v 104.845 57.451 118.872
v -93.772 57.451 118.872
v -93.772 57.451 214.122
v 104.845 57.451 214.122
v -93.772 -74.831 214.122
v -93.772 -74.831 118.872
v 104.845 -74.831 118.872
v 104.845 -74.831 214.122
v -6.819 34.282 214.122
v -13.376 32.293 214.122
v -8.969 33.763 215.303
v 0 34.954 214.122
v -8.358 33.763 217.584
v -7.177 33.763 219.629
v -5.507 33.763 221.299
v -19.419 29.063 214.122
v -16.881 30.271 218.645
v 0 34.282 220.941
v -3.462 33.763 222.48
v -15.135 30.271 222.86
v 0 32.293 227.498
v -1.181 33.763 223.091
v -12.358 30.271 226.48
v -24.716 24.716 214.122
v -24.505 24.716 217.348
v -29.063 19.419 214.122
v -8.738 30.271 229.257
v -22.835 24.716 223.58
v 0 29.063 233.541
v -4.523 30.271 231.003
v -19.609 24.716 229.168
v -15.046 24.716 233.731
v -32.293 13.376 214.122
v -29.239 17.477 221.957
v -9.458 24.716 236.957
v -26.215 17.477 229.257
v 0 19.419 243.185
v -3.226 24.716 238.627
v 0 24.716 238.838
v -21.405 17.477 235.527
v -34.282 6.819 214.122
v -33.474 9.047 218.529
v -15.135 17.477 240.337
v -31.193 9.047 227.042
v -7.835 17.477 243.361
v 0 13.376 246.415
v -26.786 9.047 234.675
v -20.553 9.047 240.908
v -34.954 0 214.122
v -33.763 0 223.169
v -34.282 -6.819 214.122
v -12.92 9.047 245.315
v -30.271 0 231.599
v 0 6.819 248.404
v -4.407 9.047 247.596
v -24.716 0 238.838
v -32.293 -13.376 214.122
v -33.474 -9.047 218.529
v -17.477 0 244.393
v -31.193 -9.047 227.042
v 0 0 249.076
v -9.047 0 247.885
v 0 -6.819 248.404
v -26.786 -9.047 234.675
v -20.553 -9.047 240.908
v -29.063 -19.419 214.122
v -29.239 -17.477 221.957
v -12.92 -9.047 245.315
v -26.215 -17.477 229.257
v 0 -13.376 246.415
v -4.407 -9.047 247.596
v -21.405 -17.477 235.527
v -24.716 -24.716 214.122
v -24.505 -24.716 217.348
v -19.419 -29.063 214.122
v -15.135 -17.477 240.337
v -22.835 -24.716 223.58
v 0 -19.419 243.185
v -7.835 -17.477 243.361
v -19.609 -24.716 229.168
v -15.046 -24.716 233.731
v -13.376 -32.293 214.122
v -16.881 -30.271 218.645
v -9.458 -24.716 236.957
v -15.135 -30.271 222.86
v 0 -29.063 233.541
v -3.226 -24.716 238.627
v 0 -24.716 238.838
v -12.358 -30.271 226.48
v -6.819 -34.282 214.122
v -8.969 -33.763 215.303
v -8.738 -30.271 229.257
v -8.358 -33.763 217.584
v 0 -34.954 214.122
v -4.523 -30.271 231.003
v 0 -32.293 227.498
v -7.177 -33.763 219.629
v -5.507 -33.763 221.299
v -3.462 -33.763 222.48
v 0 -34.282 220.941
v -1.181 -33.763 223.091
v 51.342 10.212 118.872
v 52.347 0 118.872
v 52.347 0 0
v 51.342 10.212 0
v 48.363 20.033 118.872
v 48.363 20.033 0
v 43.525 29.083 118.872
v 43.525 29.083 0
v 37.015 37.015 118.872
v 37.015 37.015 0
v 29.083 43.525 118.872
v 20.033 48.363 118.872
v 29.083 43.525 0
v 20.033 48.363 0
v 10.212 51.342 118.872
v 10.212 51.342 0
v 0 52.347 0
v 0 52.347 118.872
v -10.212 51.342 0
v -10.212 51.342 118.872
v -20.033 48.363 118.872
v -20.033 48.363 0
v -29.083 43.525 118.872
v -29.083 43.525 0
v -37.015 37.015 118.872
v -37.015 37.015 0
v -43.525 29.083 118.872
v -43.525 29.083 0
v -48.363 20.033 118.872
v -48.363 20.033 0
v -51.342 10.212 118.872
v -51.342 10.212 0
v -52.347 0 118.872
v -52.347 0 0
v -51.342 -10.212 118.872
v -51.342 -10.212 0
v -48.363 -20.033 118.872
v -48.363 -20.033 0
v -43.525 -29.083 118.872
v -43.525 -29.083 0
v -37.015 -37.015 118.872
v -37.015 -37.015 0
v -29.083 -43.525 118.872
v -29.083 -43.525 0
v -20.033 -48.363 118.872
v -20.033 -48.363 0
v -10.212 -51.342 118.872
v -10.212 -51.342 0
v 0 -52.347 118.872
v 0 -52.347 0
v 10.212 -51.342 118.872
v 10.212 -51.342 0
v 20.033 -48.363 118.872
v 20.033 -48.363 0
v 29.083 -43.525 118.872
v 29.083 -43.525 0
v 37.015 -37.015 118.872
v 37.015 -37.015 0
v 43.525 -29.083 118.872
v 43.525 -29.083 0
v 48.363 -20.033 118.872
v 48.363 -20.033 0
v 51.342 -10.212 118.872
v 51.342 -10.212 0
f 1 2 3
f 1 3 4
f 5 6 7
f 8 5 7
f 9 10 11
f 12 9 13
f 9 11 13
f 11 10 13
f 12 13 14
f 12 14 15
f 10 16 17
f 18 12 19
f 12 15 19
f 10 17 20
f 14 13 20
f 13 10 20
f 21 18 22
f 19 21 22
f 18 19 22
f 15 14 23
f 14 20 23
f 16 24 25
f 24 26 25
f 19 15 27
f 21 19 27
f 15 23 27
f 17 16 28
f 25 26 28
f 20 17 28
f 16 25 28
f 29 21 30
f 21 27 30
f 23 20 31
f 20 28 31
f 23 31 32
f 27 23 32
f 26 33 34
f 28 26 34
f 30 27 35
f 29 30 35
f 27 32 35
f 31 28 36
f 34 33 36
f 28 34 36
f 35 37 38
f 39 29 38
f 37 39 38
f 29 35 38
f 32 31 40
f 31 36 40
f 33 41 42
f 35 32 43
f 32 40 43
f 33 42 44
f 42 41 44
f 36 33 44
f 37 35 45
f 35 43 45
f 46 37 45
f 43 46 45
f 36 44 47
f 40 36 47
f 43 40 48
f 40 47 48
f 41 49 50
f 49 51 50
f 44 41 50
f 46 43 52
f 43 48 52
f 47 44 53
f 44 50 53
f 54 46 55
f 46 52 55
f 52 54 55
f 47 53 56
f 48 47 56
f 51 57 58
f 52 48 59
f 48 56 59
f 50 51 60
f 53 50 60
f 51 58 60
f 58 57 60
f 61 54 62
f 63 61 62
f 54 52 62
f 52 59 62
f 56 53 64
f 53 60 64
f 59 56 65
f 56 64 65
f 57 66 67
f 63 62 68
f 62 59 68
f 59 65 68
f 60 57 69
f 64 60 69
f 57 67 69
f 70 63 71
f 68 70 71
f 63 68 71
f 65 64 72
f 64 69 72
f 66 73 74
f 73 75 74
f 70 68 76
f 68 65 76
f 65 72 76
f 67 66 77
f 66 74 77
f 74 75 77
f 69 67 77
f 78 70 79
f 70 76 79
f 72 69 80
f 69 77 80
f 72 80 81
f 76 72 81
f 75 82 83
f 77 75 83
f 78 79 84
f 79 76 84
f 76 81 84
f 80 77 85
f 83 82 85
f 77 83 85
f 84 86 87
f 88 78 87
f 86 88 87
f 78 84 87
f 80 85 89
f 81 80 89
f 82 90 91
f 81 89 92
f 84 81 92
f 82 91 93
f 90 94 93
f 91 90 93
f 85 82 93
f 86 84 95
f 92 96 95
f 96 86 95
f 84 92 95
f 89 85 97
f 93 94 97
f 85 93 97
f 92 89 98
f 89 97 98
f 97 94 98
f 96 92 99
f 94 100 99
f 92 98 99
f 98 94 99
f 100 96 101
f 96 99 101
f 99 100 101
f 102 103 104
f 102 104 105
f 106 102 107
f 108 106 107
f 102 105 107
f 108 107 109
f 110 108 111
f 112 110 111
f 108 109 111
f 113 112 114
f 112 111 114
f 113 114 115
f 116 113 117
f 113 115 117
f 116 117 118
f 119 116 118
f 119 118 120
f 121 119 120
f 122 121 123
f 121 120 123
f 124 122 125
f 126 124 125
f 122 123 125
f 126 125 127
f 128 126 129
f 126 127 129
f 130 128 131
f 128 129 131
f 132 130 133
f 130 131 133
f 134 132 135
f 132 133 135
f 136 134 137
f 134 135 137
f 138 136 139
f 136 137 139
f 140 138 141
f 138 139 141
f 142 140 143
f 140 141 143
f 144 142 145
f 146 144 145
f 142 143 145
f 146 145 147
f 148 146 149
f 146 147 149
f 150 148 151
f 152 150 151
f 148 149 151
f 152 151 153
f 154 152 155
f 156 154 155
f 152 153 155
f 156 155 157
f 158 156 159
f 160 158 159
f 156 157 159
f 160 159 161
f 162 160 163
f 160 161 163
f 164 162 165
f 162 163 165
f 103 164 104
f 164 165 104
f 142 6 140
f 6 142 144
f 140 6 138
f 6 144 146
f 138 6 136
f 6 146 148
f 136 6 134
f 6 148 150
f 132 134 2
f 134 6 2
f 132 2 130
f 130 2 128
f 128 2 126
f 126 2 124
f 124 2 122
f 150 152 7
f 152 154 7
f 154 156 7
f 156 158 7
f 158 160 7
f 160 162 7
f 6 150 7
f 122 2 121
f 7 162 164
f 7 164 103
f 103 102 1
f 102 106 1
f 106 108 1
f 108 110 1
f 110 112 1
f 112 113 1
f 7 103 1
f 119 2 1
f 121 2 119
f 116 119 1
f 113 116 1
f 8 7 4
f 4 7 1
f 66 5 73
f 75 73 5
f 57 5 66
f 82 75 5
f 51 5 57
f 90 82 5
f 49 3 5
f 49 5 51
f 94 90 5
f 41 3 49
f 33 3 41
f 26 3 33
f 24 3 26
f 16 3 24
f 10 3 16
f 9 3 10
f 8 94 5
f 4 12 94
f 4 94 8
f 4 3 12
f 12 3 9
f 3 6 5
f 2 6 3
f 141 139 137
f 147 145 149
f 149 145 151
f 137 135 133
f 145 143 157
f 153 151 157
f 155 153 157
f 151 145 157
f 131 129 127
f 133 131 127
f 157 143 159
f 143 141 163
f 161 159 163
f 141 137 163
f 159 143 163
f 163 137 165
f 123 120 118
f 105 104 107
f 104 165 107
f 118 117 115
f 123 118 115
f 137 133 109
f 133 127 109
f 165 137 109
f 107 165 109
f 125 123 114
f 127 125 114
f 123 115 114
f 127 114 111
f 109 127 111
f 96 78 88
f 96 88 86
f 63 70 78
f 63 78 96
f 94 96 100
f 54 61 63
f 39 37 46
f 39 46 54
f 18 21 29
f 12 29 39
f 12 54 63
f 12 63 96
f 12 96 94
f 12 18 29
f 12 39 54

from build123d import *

# Parameters (mm, degrees)
F0_R          = 52.3474844596
F1_DEPTH      = 118.872
F2_W          = 198.6170932651
F2_H          = 132.2823390365
F3_DEPTH      = 95.25
F5_ANGLE_BACK = 90
F5_ANGLE      = 180


with BuildPart() as f1:
    # F0 (on Top) → F1 (new body)
    with BuildSketch(Plane.XY):
        Circle(F0_R)
    extrude(amount=F1_DEPTH)

    # F2 (on face) → F3 (join)
    with BuildSketch(Plane.XY.offset(118.872)):
        with Locations((5.5361129344, -8.6901672184)):
            Rectangle(F2_W, F2_H)
    extrude(amount=F3_DEPTH)

    # F4 (on face) → F5 (revolve)
    with BuildSketch(Plane.XY.offset(214.122), mode=Mode.PRIVATE) as f5_sk:
        with BuildLine():
            Line((0, -34.9537354881), (0, 34.9537354881))
            ThreePointArc((0, 34.9537354881), (-34.9537354881, 0), (0, -34.9537354881))
        make_face()
    revolve(f5_sk.sketch.rotate(Axis((0, 0, 214.122), (0, 1, 0)), -F5_ANGLE_BACK), axis=Axis((0, 0, 214.122), (0, 1, 0)), revolution_arc=F5_ANGLE)


solid = f1.part
